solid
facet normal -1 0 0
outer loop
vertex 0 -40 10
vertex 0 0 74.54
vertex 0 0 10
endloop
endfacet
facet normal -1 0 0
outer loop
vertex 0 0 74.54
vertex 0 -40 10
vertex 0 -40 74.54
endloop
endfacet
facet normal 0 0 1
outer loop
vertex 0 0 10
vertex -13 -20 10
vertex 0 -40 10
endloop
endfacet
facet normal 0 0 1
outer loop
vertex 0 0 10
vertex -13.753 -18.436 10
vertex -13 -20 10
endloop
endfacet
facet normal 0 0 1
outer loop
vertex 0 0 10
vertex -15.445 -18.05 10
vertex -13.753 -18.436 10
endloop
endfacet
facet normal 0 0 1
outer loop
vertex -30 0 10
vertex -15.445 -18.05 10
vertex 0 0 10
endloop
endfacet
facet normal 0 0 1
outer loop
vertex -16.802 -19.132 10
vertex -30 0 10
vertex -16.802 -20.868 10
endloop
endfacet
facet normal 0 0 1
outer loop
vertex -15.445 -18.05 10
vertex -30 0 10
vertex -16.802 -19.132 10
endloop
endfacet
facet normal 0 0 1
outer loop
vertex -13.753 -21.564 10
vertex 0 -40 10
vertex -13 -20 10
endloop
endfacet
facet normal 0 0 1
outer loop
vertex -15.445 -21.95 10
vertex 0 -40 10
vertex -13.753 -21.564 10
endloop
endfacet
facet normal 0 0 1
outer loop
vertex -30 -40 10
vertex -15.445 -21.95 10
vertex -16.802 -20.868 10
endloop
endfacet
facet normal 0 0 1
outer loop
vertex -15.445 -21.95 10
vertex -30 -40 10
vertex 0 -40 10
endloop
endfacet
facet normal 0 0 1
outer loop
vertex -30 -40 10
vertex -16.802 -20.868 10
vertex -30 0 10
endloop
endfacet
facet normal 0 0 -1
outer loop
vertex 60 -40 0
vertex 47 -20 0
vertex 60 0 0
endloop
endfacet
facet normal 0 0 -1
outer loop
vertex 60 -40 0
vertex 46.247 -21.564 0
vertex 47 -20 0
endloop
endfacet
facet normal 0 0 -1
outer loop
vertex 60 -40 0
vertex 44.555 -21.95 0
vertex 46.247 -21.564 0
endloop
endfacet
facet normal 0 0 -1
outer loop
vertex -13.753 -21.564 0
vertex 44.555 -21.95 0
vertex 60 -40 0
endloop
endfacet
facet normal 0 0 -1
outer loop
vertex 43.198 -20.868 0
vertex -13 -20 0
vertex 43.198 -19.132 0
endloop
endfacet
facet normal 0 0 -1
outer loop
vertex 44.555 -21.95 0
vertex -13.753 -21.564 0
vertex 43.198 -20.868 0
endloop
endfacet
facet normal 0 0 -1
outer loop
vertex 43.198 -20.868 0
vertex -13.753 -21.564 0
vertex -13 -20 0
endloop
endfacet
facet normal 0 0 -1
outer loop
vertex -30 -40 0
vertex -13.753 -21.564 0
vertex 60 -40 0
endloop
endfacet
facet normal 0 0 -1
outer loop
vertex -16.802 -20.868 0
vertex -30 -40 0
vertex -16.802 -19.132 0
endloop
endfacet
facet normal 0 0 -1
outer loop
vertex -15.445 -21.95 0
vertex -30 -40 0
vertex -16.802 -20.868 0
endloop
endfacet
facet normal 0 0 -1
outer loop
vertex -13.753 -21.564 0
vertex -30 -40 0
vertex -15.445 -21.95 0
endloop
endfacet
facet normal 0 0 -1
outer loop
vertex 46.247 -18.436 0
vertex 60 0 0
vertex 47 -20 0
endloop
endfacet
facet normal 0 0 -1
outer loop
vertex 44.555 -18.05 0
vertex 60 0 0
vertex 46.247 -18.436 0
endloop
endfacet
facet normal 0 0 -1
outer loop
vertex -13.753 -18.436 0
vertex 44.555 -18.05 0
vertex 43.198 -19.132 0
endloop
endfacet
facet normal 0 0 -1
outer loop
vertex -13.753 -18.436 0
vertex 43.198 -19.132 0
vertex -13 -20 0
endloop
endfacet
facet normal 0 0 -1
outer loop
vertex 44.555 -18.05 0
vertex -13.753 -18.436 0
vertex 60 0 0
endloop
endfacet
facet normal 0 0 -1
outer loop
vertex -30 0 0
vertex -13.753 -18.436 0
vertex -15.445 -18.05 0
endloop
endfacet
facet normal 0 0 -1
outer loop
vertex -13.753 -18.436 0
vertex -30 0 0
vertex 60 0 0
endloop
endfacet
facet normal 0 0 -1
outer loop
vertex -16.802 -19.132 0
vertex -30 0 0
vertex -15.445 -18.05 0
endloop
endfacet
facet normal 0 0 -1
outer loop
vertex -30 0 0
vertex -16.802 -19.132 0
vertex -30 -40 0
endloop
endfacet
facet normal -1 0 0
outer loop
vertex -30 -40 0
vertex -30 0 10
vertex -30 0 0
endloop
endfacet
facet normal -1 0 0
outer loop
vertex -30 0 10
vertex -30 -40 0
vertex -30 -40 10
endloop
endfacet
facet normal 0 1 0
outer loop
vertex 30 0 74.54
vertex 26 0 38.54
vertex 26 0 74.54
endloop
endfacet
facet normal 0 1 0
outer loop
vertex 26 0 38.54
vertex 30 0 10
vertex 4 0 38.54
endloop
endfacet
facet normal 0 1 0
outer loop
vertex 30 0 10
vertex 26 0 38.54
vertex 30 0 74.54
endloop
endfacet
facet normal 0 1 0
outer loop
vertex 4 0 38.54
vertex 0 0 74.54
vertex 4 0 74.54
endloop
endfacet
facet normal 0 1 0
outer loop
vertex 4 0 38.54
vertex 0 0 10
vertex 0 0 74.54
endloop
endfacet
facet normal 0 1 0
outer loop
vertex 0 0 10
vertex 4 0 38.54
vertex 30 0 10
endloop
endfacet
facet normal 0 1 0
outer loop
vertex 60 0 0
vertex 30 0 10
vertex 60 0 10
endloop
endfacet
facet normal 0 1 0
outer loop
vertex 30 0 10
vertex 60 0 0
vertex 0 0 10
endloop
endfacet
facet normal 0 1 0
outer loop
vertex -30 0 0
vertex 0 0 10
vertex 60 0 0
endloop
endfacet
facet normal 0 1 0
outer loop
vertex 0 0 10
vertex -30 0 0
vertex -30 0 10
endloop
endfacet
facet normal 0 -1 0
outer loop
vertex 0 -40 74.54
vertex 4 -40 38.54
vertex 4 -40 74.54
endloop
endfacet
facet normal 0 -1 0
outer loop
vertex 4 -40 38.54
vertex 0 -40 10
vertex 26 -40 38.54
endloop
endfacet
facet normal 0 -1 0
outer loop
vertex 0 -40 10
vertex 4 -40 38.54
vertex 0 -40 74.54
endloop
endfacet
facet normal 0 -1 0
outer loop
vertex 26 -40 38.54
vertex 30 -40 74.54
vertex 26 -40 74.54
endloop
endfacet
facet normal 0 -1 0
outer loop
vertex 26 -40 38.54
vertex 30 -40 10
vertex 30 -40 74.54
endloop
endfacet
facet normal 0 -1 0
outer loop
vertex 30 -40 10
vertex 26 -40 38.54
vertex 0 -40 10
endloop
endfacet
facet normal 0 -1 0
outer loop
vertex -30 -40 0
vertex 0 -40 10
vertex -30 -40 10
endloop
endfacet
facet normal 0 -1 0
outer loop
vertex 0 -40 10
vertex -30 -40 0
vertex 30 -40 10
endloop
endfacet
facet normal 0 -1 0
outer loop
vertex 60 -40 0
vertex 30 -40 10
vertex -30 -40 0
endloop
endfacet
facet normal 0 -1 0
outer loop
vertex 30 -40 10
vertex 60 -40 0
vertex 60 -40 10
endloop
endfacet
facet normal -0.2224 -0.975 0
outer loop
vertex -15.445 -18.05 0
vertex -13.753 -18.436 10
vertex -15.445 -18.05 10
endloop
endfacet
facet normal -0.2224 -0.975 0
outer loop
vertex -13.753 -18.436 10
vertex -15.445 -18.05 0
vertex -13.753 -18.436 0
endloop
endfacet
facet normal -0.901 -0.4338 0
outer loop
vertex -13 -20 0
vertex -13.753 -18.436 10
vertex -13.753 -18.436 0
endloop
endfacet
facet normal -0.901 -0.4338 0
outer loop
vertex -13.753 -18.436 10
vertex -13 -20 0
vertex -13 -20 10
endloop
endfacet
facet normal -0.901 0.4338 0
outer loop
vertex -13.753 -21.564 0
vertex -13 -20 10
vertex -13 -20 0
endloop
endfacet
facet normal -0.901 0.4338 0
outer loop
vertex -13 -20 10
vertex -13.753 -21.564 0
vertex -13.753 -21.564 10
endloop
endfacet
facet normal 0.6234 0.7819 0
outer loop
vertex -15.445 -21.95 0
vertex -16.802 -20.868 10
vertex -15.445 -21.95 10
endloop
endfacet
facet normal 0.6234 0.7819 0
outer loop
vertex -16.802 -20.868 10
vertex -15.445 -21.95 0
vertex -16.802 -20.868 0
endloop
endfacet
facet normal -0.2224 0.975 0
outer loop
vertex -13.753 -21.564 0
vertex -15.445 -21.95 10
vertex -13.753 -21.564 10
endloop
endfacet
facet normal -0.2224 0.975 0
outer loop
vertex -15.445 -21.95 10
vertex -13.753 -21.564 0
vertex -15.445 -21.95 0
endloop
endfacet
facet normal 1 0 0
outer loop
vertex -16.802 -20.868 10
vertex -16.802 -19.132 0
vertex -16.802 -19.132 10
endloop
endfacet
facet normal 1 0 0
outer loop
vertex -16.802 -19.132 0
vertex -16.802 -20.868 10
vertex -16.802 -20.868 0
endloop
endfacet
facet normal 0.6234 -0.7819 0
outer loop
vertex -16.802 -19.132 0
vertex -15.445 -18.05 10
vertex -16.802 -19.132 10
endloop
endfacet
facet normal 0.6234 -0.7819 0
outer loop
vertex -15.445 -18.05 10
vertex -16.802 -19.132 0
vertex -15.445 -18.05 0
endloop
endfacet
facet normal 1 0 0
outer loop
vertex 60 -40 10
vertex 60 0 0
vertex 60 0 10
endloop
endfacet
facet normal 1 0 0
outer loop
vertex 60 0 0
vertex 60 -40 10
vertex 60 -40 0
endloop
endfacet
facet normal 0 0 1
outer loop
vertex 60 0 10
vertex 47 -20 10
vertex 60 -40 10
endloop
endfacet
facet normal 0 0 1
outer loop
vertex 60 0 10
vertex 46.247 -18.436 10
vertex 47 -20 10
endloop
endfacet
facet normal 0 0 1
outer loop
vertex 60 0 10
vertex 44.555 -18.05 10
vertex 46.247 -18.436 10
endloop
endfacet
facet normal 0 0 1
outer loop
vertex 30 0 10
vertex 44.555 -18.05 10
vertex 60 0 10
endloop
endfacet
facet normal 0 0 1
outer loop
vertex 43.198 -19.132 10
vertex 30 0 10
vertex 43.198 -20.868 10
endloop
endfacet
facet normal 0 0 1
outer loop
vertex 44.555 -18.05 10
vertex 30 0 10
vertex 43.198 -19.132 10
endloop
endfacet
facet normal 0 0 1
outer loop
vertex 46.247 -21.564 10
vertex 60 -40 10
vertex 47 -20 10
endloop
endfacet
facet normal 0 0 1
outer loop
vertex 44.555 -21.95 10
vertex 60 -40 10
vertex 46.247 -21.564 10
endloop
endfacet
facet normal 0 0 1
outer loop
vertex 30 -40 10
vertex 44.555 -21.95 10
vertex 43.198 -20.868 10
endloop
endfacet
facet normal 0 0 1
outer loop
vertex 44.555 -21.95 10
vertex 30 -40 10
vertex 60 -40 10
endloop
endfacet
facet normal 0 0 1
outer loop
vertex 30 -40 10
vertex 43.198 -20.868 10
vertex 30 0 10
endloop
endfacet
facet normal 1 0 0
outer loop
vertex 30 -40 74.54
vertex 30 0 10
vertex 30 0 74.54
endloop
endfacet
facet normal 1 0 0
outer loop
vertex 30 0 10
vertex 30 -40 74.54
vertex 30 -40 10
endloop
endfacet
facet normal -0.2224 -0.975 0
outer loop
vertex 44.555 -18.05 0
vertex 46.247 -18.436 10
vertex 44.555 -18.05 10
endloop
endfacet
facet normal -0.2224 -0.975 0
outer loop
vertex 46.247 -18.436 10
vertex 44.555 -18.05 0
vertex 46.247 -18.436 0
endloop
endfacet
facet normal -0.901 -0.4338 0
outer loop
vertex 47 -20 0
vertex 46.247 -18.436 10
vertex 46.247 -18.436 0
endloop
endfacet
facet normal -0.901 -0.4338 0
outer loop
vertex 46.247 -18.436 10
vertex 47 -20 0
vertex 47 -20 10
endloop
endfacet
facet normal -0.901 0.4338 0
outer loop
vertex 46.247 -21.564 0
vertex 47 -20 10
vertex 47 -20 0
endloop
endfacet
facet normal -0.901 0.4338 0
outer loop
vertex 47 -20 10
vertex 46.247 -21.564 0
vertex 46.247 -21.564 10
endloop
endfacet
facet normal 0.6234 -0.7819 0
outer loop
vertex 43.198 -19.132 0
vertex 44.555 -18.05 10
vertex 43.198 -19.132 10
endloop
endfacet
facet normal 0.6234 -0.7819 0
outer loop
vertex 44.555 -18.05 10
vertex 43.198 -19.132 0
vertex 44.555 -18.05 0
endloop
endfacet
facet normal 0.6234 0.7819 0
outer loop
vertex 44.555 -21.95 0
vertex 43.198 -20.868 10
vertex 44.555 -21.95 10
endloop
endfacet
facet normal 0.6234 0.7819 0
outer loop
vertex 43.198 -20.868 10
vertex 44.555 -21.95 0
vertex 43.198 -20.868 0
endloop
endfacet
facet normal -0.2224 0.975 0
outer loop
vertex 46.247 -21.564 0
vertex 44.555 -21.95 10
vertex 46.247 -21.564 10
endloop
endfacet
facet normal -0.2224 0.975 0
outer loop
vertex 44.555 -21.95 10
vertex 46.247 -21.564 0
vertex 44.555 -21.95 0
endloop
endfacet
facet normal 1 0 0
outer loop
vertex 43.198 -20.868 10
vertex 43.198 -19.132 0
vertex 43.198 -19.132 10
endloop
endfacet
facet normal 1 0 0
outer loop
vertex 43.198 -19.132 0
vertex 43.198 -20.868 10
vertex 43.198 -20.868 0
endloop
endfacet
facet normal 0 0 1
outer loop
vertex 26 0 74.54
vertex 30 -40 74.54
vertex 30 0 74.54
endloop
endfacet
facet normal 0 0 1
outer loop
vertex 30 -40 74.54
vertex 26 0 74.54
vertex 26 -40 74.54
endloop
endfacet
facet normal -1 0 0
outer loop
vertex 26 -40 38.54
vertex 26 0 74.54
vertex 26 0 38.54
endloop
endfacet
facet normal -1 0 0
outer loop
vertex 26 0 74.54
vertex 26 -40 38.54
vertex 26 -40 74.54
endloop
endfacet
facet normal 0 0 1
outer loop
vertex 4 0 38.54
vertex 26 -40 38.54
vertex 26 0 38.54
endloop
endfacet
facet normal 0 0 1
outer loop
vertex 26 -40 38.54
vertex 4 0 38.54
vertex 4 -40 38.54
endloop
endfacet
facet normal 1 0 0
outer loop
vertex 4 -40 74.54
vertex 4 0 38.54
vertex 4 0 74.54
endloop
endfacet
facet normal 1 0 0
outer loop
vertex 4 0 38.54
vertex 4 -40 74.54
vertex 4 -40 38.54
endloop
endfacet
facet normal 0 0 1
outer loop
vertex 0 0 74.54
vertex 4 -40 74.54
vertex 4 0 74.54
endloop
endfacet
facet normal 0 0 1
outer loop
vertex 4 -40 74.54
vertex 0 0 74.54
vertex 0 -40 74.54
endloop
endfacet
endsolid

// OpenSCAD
// file: fixation.scad
module fixation() {
    difference(){
        translate([-30,-40,0])
            cube([30,40,10]);
        translate([-15,-20,-1])
            cylinder(20,2,2);
        
    }
    difference(){
        translate([30,-40,0])
            cube([30,40,10]);
        translate([45,-20,-1])
            cylinder(20,2,2);
    }
   
}
// main file
include <fixation.scad>

rotate([90,0,0])
    linear_extrude (height=40, $fn = 200)
        import (file="clips.dxf", layer="4", $fn=200);

fixation();
